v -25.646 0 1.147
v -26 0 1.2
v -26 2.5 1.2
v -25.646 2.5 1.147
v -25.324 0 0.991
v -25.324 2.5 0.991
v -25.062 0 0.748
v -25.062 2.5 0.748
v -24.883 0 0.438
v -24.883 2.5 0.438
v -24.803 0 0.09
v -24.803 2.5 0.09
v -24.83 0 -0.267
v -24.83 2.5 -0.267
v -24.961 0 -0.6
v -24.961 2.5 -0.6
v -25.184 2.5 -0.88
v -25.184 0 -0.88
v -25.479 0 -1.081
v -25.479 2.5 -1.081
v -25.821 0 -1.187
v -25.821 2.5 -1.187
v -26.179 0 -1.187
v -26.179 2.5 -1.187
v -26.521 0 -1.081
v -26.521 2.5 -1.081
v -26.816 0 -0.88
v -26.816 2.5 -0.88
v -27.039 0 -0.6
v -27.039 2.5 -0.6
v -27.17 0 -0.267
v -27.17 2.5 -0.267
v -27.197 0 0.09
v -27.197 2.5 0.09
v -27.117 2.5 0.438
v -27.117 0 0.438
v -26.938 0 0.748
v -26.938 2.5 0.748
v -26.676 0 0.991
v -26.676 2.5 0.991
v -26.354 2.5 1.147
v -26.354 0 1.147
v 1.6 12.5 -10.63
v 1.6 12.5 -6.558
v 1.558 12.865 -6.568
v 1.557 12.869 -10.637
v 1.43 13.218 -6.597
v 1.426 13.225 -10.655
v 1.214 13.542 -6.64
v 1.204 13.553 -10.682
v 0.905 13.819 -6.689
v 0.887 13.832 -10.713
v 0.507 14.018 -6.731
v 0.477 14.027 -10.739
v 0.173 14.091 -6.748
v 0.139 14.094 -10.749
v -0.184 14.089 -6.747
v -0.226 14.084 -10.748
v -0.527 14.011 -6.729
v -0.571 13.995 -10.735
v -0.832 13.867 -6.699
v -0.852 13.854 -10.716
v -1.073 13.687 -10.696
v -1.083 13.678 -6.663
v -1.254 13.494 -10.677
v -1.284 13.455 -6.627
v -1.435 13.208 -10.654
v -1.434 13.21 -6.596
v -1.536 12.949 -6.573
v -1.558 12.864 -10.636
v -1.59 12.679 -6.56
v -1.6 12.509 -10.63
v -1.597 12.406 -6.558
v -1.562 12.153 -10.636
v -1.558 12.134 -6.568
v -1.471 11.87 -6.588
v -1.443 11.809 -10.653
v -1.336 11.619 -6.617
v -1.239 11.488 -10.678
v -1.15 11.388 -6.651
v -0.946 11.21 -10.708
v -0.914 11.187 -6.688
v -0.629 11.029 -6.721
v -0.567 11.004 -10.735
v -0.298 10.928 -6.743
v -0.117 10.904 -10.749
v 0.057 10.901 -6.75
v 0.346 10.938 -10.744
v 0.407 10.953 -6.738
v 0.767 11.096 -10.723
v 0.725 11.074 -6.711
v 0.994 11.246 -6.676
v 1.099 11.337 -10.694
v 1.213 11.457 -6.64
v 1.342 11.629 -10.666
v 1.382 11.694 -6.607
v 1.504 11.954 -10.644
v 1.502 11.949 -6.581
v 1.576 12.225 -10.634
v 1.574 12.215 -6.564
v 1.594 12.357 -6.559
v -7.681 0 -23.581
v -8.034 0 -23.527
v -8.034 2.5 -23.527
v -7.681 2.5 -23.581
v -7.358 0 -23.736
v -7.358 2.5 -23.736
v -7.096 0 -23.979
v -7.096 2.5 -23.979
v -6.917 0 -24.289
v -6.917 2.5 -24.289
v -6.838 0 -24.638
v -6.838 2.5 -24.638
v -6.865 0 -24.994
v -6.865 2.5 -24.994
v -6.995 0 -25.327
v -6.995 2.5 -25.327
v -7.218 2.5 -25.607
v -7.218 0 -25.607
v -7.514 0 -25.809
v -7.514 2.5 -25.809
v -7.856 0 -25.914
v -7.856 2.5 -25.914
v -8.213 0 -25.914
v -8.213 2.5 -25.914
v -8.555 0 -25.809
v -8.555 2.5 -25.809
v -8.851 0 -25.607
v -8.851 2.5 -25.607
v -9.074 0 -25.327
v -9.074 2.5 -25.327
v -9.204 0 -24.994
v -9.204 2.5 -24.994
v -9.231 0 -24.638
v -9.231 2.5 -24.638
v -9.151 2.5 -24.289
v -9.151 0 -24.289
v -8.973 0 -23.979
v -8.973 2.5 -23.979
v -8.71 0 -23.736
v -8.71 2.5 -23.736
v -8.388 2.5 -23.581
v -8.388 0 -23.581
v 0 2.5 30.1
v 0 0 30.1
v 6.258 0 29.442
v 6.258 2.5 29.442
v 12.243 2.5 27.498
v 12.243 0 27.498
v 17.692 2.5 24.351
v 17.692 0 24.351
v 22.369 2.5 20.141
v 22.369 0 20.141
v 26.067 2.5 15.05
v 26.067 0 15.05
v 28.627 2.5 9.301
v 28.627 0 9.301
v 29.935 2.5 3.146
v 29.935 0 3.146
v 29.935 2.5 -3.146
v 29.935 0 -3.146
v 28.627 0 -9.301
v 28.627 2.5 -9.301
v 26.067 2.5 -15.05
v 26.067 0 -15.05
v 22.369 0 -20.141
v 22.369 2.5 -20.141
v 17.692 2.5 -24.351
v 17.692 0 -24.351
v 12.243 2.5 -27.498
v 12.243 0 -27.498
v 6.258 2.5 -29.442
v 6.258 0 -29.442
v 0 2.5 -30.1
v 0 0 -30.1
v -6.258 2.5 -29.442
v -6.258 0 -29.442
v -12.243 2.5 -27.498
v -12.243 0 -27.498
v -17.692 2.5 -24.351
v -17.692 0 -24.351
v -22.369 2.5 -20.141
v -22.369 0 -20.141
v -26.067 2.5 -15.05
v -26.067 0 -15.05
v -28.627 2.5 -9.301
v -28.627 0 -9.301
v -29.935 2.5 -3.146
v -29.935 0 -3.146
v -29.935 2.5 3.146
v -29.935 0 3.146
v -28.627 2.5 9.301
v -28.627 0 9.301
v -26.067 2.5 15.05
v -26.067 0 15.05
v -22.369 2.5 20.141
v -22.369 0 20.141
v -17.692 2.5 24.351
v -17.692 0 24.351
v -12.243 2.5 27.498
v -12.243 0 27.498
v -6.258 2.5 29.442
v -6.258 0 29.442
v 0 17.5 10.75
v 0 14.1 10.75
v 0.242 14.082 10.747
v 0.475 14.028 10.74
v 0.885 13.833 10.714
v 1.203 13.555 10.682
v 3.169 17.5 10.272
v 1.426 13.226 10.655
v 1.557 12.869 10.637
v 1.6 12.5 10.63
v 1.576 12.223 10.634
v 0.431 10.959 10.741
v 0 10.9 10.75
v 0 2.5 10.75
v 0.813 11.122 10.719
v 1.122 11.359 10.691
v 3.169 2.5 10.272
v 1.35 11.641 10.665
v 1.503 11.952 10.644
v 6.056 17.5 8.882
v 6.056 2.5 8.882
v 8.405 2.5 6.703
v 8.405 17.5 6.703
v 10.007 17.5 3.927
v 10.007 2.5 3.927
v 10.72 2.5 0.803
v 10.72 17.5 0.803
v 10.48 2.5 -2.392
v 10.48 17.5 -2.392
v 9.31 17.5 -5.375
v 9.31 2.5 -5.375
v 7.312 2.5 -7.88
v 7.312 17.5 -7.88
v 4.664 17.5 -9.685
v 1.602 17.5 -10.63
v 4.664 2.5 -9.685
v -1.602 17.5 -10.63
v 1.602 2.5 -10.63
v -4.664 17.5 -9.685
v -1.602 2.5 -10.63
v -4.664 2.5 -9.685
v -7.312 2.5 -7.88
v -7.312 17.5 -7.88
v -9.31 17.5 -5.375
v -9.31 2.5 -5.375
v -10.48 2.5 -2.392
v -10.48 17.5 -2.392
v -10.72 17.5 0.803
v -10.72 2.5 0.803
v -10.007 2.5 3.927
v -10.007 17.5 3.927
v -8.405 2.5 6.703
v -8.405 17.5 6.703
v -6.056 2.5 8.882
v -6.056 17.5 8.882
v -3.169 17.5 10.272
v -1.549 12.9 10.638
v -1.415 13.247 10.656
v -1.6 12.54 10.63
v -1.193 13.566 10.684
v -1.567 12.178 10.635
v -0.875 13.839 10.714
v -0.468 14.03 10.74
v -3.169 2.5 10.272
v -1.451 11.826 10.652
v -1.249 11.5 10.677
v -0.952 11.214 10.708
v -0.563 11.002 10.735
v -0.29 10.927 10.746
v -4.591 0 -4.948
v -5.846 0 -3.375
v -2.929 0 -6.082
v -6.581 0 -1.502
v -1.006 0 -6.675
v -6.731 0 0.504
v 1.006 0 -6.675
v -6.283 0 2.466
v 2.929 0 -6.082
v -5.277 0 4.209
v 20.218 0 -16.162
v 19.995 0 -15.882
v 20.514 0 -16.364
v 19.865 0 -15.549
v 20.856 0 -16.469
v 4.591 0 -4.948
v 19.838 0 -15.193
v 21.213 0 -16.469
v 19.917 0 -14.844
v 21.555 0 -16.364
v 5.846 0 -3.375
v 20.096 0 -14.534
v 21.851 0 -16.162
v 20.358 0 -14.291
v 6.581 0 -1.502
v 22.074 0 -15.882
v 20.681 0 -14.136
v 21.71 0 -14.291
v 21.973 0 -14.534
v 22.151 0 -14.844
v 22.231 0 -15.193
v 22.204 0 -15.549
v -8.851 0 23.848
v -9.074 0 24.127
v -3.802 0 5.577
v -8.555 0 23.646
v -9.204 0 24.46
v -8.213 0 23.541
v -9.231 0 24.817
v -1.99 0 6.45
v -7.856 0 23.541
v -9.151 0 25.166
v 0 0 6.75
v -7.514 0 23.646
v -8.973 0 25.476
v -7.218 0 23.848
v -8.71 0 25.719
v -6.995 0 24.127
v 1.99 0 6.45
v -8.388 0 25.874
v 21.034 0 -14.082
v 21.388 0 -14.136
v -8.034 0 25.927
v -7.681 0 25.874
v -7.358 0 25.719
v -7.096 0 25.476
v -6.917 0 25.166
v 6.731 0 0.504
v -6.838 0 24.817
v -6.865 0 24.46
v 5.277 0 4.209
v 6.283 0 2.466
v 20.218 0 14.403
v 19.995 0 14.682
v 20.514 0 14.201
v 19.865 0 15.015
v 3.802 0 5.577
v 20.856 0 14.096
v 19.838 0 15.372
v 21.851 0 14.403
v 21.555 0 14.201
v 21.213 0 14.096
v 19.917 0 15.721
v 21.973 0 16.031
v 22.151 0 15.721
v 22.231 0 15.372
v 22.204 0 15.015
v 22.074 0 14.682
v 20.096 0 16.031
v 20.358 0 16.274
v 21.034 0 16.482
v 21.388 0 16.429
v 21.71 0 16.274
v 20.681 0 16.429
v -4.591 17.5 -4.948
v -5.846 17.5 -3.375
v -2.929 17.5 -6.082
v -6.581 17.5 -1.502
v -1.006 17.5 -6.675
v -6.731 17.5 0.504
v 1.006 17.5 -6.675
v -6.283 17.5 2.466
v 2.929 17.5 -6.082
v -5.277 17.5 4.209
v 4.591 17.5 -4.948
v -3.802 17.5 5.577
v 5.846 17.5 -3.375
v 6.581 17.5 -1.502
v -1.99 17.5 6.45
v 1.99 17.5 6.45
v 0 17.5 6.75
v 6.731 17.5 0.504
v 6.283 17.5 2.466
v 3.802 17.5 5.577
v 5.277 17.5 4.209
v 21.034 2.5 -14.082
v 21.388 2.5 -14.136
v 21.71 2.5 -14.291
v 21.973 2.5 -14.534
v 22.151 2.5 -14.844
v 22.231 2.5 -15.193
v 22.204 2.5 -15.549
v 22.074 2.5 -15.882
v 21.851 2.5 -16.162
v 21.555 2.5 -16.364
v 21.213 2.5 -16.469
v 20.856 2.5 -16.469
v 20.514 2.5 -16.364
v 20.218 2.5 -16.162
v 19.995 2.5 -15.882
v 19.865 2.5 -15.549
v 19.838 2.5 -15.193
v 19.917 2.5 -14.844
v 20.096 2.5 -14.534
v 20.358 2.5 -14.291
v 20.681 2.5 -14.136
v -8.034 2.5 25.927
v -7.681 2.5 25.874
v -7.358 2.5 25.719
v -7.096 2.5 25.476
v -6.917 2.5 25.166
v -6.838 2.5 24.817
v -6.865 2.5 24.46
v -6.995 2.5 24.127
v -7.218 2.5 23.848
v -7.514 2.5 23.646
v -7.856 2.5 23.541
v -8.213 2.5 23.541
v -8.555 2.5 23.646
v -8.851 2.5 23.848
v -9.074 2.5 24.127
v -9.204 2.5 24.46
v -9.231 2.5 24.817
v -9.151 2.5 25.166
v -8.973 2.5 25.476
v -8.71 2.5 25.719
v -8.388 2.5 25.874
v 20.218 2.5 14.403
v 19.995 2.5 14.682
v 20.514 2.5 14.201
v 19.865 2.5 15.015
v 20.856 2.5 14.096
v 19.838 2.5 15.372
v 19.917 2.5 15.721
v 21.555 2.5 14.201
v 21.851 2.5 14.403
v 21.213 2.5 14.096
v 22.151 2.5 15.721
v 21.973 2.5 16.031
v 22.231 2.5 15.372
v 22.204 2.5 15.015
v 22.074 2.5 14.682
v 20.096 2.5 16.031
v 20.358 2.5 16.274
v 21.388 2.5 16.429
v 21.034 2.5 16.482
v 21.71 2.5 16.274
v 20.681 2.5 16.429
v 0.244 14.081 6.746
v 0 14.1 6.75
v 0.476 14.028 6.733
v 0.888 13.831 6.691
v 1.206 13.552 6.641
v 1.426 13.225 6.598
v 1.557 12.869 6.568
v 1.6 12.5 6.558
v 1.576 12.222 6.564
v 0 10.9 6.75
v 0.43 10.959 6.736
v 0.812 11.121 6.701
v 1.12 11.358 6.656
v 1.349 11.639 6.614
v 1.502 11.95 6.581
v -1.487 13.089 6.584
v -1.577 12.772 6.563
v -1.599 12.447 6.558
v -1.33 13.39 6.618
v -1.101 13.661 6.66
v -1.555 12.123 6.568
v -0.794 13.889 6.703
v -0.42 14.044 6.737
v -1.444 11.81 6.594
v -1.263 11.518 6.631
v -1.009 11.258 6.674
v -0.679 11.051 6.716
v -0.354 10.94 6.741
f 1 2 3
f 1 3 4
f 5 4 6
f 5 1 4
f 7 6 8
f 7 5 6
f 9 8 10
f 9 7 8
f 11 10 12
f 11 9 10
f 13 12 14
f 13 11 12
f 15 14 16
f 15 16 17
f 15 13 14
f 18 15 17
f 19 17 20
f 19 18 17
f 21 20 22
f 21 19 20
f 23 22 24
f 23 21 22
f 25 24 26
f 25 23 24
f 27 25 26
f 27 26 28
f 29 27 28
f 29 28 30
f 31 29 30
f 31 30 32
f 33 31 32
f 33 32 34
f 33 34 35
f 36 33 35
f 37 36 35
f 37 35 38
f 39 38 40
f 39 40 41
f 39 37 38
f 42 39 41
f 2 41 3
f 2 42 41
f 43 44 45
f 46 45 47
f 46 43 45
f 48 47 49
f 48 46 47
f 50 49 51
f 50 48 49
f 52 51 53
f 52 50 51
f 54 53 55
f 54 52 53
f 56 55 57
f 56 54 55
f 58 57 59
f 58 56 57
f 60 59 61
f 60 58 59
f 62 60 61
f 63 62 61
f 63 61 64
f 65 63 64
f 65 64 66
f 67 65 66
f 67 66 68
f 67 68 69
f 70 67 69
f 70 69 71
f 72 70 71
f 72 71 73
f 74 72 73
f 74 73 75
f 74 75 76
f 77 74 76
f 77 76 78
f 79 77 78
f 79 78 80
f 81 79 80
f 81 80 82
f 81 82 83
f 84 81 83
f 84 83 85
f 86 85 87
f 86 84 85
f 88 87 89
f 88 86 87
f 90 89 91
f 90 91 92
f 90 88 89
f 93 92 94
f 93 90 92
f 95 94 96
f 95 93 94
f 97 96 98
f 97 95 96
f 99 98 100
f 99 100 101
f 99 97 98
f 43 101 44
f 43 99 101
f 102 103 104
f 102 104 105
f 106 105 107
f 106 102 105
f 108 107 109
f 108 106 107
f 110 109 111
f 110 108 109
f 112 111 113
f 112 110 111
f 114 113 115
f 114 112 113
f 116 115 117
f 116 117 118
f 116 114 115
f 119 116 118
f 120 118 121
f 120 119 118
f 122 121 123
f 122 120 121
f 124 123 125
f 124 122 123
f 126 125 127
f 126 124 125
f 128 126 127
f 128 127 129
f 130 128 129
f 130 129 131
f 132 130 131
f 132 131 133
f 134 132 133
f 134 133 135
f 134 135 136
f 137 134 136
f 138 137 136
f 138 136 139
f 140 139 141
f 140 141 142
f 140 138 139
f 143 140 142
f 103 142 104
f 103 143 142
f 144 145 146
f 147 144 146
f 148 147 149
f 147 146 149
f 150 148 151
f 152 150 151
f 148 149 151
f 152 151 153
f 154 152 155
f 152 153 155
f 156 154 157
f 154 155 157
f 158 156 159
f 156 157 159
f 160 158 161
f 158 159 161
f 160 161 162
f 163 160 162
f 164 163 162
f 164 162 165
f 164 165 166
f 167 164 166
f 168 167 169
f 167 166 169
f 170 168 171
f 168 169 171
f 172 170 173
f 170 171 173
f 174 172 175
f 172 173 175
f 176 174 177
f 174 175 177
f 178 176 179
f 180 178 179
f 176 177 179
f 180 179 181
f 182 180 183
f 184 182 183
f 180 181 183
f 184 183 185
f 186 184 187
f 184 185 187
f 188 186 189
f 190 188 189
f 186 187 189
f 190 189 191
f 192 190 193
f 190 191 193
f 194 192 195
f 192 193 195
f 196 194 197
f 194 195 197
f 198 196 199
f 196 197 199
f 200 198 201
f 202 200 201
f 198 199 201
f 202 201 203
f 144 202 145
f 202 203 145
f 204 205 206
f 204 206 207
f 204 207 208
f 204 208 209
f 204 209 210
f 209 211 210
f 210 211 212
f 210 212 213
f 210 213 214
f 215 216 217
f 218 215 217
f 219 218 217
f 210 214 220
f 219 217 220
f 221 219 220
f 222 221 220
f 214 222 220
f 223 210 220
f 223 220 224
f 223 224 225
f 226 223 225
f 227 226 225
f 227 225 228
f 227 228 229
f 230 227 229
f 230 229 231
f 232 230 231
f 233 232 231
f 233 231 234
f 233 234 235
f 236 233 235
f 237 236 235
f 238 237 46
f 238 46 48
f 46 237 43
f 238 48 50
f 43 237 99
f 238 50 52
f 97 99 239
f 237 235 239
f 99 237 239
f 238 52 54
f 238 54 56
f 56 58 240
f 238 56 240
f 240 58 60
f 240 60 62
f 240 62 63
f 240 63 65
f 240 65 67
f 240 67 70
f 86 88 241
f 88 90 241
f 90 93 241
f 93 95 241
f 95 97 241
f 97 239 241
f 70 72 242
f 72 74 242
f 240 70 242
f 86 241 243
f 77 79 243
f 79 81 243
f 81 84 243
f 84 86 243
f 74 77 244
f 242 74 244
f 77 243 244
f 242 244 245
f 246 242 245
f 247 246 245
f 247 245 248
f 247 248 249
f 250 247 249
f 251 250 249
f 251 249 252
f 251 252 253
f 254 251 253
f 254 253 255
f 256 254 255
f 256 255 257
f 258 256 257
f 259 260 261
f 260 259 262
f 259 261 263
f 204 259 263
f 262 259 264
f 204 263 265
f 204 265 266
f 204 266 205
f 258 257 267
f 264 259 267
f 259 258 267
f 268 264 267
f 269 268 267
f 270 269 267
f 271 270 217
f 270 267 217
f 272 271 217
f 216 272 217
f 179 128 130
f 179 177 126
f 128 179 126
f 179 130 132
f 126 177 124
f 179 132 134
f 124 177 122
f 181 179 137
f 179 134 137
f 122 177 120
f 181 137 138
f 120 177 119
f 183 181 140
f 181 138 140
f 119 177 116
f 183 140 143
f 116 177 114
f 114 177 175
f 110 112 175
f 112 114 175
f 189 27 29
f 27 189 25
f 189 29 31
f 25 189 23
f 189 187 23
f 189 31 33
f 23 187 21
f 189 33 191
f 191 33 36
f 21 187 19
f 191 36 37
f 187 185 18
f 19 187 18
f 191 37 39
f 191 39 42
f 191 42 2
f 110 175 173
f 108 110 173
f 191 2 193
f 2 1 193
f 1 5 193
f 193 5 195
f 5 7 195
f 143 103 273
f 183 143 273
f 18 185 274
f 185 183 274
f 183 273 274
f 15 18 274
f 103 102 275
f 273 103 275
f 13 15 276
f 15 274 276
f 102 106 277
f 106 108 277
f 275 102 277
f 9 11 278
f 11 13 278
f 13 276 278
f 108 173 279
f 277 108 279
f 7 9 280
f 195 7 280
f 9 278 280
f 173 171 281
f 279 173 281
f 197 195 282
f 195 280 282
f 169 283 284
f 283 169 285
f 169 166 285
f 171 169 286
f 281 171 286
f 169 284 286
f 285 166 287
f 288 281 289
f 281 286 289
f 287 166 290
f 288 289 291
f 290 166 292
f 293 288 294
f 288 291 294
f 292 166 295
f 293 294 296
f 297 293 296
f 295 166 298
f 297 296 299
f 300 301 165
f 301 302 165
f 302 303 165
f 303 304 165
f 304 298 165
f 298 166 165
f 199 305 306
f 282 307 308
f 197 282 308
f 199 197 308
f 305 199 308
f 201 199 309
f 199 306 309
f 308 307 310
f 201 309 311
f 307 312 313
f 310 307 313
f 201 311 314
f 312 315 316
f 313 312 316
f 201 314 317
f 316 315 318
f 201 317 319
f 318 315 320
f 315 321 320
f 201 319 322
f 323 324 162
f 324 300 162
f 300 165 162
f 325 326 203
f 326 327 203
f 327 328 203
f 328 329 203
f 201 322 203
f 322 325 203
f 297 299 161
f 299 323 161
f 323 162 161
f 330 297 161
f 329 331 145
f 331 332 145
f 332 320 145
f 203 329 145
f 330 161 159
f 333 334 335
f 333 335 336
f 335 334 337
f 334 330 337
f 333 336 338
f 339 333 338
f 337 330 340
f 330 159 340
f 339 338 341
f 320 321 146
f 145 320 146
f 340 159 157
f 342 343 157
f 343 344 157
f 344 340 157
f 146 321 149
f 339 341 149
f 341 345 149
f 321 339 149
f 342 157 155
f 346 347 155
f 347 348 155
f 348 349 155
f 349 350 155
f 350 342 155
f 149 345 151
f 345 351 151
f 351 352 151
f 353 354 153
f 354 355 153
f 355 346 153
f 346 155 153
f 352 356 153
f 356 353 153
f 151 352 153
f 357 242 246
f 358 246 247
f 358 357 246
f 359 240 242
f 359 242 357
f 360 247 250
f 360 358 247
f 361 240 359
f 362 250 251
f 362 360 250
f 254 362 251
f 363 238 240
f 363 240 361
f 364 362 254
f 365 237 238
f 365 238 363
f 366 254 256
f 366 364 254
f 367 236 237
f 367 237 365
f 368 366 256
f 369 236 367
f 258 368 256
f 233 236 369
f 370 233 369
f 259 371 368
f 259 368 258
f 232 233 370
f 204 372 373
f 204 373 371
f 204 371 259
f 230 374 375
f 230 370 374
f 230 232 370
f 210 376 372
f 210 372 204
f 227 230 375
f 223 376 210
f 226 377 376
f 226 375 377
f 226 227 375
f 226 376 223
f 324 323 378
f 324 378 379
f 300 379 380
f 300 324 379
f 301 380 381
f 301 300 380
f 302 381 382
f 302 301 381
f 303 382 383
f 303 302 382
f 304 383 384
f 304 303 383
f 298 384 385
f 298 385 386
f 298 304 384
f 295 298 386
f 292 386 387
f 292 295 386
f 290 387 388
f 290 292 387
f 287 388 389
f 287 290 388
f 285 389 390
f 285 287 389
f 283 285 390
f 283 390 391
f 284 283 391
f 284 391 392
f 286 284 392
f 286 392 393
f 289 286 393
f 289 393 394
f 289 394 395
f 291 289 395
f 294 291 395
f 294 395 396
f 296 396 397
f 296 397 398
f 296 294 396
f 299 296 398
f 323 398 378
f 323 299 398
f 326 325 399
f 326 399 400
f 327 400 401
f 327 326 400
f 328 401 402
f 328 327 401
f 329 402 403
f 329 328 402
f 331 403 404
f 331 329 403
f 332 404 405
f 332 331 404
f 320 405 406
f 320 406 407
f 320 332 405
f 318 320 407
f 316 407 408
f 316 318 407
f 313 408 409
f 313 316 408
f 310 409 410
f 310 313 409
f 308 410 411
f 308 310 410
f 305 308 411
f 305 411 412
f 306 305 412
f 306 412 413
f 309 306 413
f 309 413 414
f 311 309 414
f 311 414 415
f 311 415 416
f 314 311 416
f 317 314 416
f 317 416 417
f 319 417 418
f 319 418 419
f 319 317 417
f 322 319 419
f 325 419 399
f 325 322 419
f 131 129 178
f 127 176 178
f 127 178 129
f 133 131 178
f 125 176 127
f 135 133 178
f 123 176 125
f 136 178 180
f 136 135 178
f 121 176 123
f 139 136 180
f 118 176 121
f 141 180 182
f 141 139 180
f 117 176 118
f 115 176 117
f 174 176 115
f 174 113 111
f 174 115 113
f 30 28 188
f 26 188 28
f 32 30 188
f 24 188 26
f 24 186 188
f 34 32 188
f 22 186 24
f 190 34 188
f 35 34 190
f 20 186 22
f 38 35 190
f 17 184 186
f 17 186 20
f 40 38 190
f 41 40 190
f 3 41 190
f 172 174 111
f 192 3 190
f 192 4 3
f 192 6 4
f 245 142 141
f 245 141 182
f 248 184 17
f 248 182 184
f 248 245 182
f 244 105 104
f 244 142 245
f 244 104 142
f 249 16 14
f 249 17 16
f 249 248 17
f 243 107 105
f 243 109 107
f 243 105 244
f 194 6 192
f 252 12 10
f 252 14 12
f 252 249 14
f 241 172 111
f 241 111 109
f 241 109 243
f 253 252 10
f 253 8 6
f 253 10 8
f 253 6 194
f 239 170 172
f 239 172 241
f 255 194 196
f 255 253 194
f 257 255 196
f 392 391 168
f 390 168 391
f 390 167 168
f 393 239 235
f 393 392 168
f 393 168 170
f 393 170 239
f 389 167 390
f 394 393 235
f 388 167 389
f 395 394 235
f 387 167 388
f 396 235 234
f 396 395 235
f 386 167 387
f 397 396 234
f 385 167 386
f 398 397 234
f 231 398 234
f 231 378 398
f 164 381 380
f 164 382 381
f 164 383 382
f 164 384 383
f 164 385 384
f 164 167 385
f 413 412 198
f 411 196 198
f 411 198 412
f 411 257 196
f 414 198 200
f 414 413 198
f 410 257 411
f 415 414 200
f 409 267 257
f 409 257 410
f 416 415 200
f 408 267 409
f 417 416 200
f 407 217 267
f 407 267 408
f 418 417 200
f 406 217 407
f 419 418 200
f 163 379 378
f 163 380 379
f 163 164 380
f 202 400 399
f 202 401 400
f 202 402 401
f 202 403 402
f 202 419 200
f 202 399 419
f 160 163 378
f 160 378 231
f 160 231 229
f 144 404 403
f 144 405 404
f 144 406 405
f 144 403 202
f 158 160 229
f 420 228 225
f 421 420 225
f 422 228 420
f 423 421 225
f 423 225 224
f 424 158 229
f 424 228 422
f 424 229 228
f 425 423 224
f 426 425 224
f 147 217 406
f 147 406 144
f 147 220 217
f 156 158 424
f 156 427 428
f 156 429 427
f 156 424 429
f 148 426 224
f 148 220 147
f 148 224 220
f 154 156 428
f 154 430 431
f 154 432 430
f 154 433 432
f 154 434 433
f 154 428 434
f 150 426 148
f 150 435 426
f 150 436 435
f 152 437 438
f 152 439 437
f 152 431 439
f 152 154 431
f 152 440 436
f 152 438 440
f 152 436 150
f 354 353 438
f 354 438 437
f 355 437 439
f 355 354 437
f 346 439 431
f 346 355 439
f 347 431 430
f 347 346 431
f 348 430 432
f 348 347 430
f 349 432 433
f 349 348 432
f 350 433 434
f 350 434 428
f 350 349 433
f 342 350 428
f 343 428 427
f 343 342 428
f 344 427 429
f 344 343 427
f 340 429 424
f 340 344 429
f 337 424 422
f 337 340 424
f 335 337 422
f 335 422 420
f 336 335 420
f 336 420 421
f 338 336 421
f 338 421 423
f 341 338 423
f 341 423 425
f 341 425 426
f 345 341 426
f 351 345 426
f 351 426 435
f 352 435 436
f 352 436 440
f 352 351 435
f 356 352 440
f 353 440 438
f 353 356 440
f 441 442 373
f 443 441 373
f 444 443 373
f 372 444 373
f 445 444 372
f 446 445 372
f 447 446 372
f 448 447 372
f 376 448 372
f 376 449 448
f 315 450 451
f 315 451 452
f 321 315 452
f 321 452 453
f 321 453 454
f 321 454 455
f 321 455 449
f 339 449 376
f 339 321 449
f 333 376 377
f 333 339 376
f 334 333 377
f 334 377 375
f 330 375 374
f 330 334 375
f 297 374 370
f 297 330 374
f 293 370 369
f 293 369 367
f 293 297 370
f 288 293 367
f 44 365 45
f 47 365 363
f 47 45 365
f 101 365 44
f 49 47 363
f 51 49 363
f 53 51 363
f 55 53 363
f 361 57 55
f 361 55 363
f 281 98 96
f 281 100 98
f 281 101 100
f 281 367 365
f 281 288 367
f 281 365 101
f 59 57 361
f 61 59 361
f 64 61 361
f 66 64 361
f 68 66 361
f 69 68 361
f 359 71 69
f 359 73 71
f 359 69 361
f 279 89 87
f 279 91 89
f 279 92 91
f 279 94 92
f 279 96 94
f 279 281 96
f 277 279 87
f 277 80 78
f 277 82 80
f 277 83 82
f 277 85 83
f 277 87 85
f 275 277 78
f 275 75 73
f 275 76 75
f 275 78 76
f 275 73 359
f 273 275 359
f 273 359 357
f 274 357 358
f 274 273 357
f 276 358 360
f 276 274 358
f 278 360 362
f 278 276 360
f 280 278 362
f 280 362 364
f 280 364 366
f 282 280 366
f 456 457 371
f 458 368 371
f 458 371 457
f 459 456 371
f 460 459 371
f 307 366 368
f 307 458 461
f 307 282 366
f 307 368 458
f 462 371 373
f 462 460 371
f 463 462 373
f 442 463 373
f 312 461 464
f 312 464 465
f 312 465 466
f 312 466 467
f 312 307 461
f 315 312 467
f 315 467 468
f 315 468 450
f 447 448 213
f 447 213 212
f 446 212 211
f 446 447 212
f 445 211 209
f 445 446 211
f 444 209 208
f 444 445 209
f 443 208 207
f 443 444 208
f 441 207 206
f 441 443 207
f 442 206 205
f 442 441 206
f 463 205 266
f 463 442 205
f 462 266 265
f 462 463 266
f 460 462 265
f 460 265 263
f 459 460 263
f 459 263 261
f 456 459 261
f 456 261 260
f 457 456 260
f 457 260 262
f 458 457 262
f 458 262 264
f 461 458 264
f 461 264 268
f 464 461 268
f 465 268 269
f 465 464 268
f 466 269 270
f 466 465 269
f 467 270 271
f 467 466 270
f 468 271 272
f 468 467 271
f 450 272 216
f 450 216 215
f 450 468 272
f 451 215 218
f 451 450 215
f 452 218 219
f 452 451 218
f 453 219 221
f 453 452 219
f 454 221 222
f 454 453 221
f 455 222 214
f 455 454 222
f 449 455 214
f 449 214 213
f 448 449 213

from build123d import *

# Parameters (mm, degrees)
SKETCH1_R               = 30.1
SKETCH1_R_2             = 1.2
SKETCH1_R_3             = 6.75
BOSS_EXTRUDE1_DEPTH     = 2.5
SKETCH2_R               = 10.75
SKETCH2_R_2             = 6.75
BOSS_EXTRUDE2_DEPTH     = 15
CUT_EXTRUDE1_DEPTH      = 47.024667299
CUT_EXTRUDE1_DEPTH_BACK = 47.024667299
SKETCH3_R               = 1.6


with BuildPart() as part:
    # Sketch1 → Boss-Extrude1 (new body)
    with BuildSketch(Plane(origin=(0, 0, 0), x_dir=(1, 0, 0), z_dir=(0, 1, 0))):
        with Locations(Location((0, 0, 0), (0, 0, 270))):
            Circle(SKETCH1_R)
        with Locations(Location((-26, 0, 0), (0, 0, 270))):
            Circle(SKETCH1_R_2, mode=Mode.SUBTRACT)
        with Locations(Location((-8.034441854, 24.727469424, 0), (0, 0, 270))):
            Circle(SKETCH1_R_2, mode=Mode.SUBTRACT)
        with Locations(Location((21.034441854, 15.28241656, 0), (0, 0, 270))):
            Circle(SKETCH1_R_2, mode=Mode.SUBTRACT)
        with Locations(Location((21.034441854, -15.28241656, 0), (0, 0, 270))):
            Circle(SKETCH1_R_2, mode=Mode.SUBTRACT)
        with Locations(Location((-8.034441854, -24.727469424, 0), (0, 0, 270))):
            Circle(SKETCH1_R_2, mode=Mode.SUBTRACT)
        with Locations(Location((0, 0, 0), (0, 0, 270))):
            Circle(SKETCH1_R_3, mode=Mode.SUBTRACT)
    extrude(amount=BOSS_EXTRUDE1_DEPTH)

    # Sketch2 → Boss-Extrude2 (add)
    with BuildSketch(Plane(origin=(0, 2.5, 0), x_dir=(1, 0, 0), z_dir=(0, 1, 0))):
        with Locations(Location((0, 0, 0), (0, 0, 270))):
            Circle(SKETCH2_R)
        with Locations(Location((0, 0, 0), (0, 0, 270))):
            Circle(SKETCH2_R_2, mode=Mode.SUBTRACT)
    extrude(amount=BOSS_EXTRUDE2_DEPTH)

    # Sketch3 → Cut-Extrude1 (cut, two sides: drawn at the far end of the back side and taken through both)
    with BuildSketch(Plane.XY.offset(-CUT_EXTRUDE1_DEPTH_BACK)):
        with Locations((0, 12.5)):
            Circle(SKETCH3_R)
    extrude(amount=CUT_EXTRUDE1_DEPTH + CUT_EXTRUDE1_DEPTH_BACK, mode=Mode.SUBTRACT)


solid = part.part
